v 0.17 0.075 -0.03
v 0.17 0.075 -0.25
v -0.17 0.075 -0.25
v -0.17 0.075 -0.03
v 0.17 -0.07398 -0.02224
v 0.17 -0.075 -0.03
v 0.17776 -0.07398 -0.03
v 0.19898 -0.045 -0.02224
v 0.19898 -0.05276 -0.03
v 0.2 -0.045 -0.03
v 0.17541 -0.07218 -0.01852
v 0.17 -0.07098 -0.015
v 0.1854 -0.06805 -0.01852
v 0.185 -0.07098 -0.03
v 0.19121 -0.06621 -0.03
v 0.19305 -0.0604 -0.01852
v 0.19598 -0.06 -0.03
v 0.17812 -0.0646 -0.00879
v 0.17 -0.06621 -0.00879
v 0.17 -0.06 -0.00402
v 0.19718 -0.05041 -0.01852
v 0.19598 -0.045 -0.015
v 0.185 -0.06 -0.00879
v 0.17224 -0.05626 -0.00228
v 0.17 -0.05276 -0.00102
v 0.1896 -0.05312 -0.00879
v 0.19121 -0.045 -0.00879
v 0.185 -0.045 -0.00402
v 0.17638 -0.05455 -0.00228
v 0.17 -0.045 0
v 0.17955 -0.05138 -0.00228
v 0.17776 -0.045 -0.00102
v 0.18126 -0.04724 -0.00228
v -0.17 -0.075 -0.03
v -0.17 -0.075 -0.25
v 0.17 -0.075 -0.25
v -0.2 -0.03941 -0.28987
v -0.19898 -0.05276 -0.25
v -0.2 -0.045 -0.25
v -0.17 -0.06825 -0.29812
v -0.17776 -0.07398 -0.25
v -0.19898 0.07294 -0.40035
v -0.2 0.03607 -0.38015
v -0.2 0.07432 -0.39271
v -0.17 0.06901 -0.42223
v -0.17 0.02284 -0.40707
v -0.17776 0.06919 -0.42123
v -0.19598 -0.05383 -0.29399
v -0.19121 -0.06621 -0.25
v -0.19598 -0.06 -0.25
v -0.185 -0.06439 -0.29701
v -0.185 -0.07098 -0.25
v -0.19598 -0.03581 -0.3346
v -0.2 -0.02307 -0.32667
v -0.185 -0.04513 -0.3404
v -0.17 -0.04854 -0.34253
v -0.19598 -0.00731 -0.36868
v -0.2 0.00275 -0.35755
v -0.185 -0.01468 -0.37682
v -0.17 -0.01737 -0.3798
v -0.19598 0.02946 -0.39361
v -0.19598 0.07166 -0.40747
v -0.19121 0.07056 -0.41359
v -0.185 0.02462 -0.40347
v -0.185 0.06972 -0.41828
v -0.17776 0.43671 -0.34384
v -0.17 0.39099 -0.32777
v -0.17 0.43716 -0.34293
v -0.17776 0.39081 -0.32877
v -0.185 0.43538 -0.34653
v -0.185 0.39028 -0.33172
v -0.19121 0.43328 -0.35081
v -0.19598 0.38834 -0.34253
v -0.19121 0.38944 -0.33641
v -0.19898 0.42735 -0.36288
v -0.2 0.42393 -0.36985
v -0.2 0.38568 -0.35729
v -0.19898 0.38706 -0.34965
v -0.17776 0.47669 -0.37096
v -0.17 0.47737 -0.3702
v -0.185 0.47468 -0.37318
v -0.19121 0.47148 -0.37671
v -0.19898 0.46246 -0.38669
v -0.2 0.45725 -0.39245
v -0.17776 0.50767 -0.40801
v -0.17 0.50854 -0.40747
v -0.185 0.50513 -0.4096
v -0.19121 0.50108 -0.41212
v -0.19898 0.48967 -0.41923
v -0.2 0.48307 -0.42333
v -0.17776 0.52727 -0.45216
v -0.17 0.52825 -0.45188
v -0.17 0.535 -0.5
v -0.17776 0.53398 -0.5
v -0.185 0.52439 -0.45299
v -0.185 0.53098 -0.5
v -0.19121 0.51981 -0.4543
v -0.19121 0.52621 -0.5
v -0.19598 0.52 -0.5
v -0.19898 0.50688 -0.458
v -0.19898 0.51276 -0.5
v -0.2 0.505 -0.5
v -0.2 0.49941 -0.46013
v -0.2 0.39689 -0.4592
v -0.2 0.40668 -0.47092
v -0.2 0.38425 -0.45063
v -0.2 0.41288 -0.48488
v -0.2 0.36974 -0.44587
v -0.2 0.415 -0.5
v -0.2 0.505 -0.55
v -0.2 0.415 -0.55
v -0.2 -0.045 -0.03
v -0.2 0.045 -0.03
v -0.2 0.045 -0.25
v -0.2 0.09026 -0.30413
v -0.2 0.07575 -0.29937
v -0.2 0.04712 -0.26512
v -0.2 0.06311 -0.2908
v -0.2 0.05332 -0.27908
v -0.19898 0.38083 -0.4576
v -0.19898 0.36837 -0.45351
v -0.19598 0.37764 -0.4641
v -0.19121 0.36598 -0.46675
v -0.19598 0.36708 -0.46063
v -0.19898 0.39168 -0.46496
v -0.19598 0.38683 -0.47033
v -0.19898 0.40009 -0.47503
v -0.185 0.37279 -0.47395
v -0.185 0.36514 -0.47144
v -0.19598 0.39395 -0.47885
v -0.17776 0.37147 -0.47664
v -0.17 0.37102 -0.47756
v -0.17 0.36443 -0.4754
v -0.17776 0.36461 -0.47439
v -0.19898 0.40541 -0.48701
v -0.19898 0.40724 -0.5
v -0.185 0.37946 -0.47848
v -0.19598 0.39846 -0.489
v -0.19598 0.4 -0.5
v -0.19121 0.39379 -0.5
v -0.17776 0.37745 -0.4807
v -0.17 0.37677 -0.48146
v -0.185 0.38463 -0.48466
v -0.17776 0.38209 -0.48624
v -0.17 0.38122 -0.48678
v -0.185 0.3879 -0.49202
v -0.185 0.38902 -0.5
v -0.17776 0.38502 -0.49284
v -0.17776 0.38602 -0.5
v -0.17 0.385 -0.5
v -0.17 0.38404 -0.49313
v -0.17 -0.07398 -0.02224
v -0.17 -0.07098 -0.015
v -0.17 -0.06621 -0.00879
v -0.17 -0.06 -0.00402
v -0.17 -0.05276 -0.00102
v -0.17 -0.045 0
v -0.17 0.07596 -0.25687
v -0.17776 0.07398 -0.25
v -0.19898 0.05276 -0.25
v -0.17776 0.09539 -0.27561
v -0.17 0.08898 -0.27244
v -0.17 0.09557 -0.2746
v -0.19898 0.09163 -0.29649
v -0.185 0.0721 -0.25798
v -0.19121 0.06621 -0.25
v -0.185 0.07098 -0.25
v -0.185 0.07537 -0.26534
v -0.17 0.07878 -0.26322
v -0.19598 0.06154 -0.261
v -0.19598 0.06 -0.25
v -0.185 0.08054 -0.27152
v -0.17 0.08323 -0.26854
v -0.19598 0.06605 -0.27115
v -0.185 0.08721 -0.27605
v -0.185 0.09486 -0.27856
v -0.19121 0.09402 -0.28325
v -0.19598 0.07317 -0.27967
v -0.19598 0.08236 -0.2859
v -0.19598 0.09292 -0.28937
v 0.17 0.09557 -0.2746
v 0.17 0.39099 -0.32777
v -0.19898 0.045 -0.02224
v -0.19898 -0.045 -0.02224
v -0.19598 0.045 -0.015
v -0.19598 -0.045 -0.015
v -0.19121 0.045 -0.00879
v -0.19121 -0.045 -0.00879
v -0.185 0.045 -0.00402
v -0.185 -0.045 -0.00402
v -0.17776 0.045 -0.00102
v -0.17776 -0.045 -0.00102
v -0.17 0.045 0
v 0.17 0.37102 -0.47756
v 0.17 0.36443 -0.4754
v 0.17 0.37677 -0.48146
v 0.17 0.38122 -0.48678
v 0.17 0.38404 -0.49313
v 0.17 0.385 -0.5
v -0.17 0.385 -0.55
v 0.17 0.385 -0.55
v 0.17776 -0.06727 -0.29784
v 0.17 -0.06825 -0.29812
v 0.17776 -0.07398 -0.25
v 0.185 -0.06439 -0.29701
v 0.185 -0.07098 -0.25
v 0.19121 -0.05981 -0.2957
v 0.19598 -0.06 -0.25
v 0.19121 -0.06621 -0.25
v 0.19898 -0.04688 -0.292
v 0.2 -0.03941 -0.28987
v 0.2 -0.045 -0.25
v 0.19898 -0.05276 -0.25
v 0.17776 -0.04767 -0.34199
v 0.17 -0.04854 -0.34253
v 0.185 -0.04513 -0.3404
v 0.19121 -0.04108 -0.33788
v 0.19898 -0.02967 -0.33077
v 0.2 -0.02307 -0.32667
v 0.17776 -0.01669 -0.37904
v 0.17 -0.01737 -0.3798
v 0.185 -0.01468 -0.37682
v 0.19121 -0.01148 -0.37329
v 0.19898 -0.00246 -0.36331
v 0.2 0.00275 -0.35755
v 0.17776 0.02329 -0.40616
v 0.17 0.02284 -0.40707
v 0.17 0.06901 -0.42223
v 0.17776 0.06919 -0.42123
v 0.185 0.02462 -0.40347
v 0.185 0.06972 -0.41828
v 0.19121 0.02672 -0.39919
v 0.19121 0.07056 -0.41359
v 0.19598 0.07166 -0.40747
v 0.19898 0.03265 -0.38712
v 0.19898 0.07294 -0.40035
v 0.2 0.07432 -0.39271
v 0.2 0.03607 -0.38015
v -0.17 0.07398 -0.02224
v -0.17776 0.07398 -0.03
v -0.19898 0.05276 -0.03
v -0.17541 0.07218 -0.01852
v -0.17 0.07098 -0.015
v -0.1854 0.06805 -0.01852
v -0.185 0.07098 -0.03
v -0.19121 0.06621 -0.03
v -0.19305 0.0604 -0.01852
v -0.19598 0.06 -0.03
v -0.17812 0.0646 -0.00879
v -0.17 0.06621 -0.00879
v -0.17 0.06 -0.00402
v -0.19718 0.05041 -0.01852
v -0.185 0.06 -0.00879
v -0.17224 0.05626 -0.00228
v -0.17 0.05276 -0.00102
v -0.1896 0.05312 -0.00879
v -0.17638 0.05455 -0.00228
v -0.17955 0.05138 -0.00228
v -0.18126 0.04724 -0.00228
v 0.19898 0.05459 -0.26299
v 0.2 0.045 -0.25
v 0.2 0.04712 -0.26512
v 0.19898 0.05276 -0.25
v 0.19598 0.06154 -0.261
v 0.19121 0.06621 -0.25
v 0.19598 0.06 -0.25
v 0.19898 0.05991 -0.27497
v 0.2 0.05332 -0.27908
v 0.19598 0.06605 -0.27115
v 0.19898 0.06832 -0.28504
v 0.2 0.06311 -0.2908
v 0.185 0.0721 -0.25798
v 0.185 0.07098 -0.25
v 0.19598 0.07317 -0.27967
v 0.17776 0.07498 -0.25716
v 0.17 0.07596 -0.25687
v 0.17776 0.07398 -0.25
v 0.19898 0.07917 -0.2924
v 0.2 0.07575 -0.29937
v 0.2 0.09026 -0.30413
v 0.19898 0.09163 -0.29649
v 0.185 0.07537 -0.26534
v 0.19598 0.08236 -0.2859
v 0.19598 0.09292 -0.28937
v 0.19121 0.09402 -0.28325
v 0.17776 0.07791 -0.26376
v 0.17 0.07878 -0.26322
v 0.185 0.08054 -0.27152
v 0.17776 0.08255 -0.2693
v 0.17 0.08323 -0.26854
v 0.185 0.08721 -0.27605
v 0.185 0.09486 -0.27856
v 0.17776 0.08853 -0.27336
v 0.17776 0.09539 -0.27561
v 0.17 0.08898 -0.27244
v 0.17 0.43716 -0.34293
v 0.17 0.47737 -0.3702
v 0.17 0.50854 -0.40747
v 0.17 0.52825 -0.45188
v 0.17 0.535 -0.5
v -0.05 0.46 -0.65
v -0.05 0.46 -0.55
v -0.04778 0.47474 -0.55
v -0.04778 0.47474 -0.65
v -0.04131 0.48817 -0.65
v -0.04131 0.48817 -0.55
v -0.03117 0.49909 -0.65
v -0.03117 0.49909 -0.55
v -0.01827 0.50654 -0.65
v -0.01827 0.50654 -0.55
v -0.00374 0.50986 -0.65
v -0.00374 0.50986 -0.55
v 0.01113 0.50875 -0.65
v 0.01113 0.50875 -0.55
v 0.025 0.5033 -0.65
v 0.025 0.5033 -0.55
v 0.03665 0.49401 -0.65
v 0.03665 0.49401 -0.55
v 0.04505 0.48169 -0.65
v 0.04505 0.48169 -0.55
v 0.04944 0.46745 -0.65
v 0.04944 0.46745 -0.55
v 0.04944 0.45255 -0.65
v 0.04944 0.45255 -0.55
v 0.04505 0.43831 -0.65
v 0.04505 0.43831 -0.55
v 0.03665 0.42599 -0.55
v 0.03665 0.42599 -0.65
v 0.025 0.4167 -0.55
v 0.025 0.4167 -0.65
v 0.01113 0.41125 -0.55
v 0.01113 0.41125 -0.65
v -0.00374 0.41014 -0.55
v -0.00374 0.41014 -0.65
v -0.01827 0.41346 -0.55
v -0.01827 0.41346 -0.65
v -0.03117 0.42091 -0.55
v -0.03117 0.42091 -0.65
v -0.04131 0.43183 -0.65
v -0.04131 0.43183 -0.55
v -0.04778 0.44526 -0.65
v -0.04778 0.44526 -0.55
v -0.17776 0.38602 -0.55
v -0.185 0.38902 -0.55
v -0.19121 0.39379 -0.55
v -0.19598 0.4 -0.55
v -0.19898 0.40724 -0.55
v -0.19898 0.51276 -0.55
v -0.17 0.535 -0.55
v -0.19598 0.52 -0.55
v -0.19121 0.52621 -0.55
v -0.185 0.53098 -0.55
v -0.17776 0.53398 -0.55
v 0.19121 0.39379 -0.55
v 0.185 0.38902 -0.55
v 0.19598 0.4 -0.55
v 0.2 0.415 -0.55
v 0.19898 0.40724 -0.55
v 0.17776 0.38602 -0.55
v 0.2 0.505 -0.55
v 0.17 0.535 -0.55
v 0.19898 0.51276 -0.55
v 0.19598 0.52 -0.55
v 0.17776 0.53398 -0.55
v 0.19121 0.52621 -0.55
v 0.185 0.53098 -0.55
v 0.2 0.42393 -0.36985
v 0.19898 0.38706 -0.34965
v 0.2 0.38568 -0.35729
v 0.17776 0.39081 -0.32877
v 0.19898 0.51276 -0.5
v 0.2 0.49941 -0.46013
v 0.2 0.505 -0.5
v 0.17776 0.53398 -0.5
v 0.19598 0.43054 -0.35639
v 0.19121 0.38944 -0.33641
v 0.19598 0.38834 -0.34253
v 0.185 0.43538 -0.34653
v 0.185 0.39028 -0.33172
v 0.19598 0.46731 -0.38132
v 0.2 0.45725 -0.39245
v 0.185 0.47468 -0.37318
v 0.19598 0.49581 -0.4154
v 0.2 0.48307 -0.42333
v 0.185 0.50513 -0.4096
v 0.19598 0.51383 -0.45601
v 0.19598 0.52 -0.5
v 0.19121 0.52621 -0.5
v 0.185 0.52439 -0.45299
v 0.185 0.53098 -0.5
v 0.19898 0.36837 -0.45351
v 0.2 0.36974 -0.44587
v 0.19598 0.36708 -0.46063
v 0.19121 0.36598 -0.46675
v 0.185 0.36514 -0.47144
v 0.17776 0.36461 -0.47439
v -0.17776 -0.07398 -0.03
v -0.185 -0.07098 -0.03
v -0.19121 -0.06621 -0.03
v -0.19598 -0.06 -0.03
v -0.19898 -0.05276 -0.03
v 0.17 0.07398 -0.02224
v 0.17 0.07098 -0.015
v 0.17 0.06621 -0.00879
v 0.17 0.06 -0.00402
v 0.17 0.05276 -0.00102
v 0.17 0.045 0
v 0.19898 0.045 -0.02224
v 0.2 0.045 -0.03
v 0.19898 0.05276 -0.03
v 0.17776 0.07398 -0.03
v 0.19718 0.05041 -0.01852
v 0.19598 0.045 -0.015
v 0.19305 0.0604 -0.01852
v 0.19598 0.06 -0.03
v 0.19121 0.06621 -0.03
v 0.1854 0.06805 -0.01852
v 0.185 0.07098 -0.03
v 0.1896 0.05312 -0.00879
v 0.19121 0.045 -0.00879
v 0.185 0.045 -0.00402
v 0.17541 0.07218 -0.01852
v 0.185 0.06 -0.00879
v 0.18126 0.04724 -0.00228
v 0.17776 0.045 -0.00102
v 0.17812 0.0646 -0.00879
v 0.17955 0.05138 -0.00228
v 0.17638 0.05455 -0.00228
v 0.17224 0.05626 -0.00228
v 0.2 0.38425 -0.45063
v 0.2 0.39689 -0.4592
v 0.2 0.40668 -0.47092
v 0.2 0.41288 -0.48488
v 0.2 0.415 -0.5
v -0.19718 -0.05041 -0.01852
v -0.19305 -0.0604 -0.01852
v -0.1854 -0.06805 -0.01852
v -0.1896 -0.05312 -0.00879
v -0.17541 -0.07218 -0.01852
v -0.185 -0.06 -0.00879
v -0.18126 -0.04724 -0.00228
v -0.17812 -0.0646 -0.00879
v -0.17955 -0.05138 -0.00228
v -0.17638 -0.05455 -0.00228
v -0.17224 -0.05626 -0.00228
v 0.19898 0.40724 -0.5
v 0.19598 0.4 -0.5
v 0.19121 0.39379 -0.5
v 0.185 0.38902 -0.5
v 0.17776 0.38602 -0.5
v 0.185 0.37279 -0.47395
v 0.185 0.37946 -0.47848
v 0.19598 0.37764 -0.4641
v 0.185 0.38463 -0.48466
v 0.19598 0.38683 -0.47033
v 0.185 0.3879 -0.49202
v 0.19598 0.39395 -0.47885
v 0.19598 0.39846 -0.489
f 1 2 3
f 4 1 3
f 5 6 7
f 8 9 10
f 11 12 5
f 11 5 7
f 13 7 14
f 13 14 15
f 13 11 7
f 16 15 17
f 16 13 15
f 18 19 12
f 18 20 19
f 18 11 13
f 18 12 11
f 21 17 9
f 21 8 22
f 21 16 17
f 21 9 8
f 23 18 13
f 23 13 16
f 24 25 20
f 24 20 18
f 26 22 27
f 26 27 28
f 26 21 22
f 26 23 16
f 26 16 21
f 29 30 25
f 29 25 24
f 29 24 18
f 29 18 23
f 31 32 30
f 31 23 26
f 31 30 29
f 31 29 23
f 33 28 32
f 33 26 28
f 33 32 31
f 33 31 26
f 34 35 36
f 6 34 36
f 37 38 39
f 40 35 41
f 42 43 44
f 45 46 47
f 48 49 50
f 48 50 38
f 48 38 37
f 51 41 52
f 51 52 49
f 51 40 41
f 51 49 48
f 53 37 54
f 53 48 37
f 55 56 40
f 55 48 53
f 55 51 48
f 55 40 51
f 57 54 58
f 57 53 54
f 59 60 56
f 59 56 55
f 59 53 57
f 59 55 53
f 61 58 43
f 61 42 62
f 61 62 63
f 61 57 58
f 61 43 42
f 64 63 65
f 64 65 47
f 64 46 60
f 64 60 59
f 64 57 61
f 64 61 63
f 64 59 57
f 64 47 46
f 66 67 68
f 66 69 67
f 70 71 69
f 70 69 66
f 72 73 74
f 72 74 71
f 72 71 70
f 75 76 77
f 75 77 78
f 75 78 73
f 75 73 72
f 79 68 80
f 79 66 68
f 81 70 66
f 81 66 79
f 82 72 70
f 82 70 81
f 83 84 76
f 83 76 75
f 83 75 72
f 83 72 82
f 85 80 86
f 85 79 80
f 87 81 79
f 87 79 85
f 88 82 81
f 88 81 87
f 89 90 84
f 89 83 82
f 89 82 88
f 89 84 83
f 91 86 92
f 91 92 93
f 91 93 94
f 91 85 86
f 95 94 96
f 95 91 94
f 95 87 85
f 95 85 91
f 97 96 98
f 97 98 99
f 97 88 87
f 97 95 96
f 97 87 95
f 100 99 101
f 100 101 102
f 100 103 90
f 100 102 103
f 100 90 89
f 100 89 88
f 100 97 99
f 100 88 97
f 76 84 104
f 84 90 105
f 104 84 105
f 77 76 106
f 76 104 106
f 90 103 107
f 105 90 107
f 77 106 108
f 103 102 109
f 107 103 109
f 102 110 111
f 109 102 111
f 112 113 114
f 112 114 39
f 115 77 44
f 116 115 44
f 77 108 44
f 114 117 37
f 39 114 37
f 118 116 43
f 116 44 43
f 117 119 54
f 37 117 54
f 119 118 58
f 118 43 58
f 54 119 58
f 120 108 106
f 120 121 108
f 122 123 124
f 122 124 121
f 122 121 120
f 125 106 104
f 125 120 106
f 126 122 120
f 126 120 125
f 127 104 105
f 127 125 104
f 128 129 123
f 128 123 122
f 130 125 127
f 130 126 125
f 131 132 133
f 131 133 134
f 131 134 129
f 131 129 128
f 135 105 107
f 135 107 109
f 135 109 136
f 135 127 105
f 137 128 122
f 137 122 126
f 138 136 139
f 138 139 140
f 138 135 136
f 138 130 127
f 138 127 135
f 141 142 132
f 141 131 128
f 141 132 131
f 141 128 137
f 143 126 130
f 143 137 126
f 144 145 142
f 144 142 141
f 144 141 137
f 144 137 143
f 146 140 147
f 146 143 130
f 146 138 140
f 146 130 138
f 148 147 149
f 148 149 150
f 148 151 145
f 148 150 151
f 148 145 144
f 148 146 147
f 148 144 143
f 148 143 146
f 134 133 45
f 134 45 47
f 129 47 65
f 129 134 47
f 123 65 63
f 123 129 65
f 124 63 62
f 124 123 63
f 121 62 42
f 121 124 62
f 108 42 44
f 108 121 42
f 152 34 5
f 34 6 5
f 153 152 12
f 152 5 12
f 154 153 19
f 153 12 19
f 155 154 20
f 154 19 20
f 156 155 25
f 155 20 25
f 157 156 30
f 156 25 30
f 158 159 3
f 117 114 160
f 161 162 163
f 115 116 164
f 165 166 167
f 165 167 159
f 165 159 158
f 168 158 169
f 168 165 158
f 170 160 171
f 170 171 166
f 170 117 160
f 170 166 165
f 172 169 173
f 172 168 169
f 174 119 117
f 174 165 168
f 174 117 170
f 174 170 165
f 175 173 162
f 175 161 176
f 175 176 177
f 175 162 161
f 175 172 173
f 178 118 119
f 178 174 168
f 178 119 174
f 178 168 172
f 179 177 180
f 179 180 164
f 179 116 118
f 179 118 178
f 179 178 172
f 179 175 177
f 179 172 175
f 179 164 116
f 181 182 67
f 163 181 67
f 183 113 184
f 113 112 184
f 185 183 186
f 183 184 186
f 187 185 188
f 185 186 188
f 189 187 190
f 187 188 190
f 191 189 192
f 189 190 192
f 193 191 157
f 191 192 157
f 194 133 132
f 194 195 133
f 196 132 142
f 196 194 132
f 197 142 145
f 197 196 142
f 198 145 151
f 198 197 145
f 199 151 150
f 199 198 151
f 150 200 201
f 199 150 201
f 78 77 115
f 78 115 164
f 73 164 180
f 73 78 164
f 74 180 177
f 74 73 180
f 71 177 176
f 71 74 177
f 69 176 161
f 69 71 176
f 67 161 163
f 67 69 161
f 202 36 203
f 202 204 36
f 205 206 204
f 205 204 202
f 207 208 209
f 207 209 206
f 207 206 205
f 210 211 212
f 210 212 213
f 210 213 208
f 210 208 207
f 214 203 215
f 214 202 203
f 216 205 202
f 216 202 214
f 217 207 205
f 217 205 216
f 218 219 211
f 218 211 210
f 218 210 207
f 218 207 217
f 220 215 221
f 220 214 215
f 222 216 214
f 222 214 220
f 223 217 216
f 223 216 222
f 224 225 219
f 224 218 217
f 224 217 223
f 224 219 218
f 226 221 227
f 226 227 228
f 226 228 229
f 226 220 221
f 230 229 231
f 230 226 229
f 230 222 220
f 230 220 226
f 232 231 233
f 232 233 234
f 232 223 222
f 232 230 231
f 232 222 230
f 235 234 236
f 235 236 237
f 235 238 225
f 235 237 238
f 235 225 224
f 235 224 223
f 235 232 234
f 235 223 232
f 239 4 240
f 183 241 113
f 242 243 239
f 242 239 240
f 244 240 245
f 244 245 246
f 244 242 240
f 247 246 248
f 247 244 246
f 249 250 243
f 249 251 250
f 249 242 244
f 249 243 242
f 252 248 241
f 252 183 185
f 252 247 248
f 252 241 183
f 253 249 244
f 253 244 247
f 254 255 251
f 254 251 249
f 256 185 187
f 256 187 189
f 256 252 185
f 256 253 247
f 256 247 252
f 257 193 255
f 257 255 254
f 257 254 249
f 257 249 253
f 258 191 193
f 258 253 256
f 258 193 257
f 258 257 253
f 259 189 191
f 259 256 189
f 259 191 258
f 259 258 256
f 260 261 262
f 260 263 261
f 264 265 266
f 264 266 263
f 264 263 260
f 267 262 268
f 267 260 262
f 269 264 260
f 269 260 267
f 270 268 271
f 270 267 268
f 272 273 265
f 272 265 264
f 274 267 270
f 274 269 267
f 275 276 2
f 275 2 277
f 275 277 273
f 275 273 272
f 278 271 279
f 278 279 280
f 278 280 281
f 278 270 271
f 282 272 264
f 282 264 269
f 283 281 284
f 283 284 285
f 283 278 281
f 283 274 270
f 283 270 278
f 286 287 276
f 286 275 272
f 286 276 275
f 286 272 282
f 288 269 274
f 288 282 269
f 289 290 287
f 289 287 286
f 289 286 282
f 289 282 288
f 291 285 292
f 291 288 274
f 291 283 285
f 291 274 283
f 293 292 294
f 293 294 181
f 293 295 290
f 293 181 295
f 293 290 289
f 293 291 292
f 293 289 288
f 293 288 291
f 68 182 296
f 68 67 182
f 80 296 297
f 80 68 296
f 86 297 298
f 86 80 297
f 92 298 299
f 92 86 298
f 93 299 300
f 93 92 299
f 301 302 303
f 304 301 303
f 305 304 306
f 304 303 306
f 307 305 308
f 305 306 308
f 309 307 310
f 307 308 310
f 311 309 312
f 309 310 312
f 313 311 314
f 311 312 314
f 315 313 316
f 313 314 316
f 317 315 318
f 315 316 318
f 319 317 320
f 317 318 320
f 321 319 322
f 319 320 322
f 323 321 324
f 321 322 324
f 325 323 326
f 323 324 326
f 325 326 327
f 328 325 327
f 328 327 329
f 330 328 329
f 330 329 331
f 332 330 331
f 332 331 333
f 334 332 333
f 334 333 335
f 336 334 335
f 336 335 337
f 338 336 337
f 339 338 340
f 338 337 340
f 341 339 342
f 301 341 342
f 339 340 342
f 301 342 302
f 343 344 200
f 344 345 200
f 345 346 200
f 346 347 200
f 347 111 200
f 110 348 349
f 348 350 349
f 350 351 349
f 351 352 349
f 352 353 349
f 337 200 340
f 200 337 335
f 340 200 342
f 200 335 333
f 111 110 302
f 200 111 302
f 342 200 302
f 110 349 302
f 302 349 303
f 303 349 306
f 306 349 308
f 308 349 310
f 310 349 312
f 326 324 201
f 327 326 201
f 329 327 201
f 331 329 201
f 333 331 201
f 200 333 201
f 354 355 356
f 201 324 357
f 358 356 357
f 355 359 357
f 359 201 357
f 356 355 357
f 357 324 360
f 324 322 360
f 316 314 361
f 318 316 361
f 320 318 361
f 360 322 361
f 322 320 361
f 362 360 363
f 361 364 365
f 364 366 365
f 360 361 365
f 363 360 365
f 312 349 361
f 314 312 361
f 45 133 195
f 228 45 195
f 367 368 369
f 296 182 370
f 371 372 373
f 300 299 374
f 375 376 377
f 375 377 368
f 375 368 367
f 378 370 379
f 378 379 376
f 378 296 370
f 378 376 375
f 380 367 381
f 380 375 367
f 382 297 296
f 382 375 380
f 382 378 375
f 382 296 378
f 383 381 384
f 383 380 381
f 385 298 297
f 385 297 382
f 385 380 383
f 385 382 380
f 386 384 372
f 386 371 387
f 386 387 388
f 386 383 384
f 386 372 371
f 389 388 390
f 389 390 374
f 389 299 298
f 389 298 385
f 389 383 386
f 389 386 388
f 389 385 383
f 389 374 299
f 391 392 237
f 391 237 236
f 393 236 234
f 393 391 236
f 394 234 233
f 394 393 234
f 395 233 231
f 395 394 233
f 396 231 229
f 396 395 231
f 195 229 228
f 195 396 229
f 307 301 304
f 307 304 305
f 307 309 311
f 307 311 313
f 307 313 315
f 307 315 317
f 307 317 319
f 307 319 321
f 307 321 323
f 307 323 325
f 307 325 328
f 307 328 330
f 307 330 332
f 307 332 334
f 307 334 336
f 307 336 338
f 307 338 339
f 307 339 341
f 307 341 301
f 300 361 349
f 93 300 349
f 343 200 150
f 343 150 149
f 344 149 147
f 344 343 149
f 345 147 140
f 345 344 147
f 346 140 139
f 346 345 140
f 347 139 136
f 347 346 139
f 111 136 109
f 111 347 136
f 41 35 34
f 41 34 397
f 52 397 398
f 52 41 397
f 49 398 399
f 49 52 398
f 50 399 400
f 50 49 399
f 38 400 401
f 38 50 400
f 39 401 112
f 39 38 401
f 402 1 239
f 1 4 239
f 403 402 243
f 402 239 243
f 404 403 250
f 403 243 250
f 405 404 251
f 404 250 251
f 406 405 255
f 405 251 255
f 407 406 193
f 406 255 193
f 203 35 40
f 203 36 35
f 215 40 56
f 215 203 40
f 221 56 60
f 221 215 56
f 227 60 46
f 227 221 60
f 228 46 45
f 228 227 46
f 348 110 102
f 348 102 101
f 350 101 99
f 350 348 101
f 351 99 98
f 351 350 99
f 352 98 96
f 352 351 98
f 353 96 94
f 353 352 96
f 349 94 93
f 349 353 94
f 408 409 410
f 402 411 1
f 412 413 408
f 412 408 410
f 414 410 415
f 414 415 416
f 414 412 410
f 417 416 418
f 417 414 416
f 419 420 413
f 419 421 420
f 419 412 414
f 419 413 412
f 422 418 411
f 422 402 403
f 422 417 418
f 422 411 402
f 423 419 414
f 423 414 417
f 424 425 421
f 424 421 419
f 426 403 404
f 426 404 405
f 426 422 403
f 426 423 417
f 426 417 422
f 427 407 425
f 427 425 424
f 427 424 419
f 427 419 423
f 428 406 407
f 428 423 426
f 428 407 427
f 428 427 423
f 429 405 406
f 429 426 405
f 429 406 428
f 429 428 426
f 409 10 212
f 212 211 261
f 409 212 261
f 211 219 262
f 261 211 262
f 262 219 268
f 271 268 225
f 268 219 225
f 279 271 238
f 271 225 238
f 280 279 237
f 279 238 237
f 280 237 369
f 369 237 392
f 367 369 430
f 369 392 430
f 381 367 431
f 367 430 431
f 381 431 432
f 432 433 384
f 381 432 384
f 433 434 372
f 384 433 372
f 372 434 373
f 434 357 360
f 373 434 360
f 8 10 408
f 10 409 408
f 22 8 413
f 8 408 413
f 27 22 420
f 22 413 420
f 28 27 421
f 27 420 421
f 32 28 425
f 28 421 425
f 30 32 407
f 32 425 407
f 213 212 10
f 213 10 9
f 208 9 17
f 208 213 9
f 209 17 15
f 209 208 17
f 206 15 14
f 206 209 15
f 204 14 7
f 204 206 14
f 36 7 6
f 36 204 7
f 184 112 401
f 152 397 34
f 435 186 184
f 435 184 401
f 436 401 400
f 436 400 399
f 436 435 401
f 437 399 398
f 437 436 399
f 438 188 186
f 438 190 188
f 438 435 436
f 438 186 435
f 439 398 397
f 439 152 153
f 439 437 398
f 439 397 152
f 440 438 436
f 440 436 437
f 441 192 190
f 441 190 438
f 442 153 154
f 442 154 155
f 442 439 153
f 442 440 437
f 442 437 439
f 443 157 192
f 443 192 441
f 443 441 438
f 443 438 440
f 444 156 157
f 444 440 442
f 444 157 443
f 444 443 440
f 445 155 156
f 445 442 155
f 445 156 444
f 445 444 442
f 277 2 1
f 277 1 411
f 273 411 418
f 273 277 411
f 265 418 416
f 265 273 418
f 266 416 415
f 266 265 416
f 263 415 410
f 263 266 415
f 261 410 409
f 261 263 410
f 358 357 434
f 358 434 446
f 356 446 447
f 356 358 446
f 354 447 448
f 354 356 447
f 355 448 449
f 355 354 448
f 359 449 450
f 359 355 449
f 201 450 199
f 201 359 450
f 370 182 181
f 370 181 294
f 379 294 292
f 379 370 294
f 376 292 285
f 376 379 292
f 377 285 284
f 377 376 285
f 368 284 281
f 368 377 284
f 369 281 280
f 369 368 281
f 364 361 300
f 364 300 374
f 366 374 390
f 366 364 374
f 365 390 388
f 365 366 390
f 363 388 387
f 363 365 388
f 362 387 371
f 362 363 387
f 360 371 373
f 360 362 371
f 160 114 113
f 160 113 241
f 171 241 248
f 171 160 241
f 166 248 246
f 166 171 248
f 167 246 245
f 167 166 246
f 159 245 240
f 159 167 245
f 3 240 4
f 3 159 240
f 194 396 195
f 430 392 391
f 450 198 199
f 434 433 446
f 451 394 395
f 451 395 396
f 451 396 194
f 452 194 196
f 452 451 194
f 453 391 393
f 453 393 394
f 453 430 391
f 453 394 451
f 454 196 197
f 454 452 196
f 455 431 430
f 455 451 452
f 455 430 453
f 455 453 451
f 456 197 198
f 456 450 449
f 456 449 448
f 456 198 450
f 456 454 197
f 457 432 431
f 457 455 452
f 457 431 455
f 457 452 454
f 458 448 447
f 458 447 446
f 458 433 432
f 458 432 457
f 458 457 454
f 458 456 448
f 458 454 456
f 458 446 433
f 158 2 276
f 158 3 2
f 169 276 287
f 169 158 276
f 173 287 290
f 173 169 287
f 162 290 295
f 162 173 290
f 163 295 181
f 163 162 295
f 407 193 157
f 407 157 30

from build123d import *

# Parameters (mm, degrees)
FILETE2_R                = 0.03
ESBO_O3_R                = 0.05
RESSALTO_EXTRUS_O1_DEPTH = 0.1


with BuildPart() as part:
    # Varredura1: sweep along a path in Esboço2
    with BuildLine(Plane(origin=(0, 0, 0), x_dir=(0, 0, -1), z_dir=(1, 0, 0))) as varredura1_path:
        Line((0, 0), (0.25, 0))
        ThreePointArc((0.25, 0), (0.314144085, 0.023282751), (0.348419155, 0.082289274))
        Line((0.348419155, 0.082289274), (0.401580845, 0.377710726))
        ThreePointArc((0.401580845, 0.377710726), (0.435855915, 0.436717249), (0.5, 0.46))
        Line((0.5, 0.46), (0.55, 0.46))
    # Esboço1 → Varredura1 (sweep)
    with BuildSketch(Plane.XY):
        with BuildLine():
            Line((-0.17, -0.075), (0.17, -0.075))
            ThreePointArc((0.17, -0.075), (0.191213203, -0.066213203), (0.2, -0.045))
            Line((0.2, -0.045), (0.2, 0.045))
            ThreePointArc((0.2, 0.045), (0.191213203, 0.066213203), (0.17, 0.075))
            Line((0.17, 0.075), (-0.17, 0.075))
            ThreePointArc((-0.17, 0.075), (-0.191213203, 0.066213203), (-0.2, 0.045))
            Line((-0.2, 0.045), (-0.2, -0.045))
            ThreePointArc((-0.2, -0.045), (-0.191213203, -0.066213203), (-0.17, -0.075))
        make_face()
    sweep(path=varredura1_path.line)

    # Filete2
    filete2_edges = [part.edges().sort_by_distance(p)[0] for p in [
        (-0.2, 0, 0),
        (-0.191213203, 0.066213203, 0),
        (0, 0.075, 0),
        (0.191213203, 0.066213203, 0),
        (0.2, 0, 0),
        (0.191213203, -0.066213203, 0),
        (0, -0.075, 0),
        (-0.191213203, -0.066213203, 0),
    ]]
    fillet(filete2_edges, radius=FILETE2_R)

    # Esboço3 → Ressalto-extrusão1 (add)
    with BuildSketch(Plane(origin=(0, 0, -0.55), x_dir=(-1, 0, 0), z_dir=(0, 0, -1))):
        with Locations((0, 0.46)):
            Circle(ESBO_O3_R)
    extrude(amount=RESSALTO_EXTRUS_O1_DEPTH)


solid = part.part
